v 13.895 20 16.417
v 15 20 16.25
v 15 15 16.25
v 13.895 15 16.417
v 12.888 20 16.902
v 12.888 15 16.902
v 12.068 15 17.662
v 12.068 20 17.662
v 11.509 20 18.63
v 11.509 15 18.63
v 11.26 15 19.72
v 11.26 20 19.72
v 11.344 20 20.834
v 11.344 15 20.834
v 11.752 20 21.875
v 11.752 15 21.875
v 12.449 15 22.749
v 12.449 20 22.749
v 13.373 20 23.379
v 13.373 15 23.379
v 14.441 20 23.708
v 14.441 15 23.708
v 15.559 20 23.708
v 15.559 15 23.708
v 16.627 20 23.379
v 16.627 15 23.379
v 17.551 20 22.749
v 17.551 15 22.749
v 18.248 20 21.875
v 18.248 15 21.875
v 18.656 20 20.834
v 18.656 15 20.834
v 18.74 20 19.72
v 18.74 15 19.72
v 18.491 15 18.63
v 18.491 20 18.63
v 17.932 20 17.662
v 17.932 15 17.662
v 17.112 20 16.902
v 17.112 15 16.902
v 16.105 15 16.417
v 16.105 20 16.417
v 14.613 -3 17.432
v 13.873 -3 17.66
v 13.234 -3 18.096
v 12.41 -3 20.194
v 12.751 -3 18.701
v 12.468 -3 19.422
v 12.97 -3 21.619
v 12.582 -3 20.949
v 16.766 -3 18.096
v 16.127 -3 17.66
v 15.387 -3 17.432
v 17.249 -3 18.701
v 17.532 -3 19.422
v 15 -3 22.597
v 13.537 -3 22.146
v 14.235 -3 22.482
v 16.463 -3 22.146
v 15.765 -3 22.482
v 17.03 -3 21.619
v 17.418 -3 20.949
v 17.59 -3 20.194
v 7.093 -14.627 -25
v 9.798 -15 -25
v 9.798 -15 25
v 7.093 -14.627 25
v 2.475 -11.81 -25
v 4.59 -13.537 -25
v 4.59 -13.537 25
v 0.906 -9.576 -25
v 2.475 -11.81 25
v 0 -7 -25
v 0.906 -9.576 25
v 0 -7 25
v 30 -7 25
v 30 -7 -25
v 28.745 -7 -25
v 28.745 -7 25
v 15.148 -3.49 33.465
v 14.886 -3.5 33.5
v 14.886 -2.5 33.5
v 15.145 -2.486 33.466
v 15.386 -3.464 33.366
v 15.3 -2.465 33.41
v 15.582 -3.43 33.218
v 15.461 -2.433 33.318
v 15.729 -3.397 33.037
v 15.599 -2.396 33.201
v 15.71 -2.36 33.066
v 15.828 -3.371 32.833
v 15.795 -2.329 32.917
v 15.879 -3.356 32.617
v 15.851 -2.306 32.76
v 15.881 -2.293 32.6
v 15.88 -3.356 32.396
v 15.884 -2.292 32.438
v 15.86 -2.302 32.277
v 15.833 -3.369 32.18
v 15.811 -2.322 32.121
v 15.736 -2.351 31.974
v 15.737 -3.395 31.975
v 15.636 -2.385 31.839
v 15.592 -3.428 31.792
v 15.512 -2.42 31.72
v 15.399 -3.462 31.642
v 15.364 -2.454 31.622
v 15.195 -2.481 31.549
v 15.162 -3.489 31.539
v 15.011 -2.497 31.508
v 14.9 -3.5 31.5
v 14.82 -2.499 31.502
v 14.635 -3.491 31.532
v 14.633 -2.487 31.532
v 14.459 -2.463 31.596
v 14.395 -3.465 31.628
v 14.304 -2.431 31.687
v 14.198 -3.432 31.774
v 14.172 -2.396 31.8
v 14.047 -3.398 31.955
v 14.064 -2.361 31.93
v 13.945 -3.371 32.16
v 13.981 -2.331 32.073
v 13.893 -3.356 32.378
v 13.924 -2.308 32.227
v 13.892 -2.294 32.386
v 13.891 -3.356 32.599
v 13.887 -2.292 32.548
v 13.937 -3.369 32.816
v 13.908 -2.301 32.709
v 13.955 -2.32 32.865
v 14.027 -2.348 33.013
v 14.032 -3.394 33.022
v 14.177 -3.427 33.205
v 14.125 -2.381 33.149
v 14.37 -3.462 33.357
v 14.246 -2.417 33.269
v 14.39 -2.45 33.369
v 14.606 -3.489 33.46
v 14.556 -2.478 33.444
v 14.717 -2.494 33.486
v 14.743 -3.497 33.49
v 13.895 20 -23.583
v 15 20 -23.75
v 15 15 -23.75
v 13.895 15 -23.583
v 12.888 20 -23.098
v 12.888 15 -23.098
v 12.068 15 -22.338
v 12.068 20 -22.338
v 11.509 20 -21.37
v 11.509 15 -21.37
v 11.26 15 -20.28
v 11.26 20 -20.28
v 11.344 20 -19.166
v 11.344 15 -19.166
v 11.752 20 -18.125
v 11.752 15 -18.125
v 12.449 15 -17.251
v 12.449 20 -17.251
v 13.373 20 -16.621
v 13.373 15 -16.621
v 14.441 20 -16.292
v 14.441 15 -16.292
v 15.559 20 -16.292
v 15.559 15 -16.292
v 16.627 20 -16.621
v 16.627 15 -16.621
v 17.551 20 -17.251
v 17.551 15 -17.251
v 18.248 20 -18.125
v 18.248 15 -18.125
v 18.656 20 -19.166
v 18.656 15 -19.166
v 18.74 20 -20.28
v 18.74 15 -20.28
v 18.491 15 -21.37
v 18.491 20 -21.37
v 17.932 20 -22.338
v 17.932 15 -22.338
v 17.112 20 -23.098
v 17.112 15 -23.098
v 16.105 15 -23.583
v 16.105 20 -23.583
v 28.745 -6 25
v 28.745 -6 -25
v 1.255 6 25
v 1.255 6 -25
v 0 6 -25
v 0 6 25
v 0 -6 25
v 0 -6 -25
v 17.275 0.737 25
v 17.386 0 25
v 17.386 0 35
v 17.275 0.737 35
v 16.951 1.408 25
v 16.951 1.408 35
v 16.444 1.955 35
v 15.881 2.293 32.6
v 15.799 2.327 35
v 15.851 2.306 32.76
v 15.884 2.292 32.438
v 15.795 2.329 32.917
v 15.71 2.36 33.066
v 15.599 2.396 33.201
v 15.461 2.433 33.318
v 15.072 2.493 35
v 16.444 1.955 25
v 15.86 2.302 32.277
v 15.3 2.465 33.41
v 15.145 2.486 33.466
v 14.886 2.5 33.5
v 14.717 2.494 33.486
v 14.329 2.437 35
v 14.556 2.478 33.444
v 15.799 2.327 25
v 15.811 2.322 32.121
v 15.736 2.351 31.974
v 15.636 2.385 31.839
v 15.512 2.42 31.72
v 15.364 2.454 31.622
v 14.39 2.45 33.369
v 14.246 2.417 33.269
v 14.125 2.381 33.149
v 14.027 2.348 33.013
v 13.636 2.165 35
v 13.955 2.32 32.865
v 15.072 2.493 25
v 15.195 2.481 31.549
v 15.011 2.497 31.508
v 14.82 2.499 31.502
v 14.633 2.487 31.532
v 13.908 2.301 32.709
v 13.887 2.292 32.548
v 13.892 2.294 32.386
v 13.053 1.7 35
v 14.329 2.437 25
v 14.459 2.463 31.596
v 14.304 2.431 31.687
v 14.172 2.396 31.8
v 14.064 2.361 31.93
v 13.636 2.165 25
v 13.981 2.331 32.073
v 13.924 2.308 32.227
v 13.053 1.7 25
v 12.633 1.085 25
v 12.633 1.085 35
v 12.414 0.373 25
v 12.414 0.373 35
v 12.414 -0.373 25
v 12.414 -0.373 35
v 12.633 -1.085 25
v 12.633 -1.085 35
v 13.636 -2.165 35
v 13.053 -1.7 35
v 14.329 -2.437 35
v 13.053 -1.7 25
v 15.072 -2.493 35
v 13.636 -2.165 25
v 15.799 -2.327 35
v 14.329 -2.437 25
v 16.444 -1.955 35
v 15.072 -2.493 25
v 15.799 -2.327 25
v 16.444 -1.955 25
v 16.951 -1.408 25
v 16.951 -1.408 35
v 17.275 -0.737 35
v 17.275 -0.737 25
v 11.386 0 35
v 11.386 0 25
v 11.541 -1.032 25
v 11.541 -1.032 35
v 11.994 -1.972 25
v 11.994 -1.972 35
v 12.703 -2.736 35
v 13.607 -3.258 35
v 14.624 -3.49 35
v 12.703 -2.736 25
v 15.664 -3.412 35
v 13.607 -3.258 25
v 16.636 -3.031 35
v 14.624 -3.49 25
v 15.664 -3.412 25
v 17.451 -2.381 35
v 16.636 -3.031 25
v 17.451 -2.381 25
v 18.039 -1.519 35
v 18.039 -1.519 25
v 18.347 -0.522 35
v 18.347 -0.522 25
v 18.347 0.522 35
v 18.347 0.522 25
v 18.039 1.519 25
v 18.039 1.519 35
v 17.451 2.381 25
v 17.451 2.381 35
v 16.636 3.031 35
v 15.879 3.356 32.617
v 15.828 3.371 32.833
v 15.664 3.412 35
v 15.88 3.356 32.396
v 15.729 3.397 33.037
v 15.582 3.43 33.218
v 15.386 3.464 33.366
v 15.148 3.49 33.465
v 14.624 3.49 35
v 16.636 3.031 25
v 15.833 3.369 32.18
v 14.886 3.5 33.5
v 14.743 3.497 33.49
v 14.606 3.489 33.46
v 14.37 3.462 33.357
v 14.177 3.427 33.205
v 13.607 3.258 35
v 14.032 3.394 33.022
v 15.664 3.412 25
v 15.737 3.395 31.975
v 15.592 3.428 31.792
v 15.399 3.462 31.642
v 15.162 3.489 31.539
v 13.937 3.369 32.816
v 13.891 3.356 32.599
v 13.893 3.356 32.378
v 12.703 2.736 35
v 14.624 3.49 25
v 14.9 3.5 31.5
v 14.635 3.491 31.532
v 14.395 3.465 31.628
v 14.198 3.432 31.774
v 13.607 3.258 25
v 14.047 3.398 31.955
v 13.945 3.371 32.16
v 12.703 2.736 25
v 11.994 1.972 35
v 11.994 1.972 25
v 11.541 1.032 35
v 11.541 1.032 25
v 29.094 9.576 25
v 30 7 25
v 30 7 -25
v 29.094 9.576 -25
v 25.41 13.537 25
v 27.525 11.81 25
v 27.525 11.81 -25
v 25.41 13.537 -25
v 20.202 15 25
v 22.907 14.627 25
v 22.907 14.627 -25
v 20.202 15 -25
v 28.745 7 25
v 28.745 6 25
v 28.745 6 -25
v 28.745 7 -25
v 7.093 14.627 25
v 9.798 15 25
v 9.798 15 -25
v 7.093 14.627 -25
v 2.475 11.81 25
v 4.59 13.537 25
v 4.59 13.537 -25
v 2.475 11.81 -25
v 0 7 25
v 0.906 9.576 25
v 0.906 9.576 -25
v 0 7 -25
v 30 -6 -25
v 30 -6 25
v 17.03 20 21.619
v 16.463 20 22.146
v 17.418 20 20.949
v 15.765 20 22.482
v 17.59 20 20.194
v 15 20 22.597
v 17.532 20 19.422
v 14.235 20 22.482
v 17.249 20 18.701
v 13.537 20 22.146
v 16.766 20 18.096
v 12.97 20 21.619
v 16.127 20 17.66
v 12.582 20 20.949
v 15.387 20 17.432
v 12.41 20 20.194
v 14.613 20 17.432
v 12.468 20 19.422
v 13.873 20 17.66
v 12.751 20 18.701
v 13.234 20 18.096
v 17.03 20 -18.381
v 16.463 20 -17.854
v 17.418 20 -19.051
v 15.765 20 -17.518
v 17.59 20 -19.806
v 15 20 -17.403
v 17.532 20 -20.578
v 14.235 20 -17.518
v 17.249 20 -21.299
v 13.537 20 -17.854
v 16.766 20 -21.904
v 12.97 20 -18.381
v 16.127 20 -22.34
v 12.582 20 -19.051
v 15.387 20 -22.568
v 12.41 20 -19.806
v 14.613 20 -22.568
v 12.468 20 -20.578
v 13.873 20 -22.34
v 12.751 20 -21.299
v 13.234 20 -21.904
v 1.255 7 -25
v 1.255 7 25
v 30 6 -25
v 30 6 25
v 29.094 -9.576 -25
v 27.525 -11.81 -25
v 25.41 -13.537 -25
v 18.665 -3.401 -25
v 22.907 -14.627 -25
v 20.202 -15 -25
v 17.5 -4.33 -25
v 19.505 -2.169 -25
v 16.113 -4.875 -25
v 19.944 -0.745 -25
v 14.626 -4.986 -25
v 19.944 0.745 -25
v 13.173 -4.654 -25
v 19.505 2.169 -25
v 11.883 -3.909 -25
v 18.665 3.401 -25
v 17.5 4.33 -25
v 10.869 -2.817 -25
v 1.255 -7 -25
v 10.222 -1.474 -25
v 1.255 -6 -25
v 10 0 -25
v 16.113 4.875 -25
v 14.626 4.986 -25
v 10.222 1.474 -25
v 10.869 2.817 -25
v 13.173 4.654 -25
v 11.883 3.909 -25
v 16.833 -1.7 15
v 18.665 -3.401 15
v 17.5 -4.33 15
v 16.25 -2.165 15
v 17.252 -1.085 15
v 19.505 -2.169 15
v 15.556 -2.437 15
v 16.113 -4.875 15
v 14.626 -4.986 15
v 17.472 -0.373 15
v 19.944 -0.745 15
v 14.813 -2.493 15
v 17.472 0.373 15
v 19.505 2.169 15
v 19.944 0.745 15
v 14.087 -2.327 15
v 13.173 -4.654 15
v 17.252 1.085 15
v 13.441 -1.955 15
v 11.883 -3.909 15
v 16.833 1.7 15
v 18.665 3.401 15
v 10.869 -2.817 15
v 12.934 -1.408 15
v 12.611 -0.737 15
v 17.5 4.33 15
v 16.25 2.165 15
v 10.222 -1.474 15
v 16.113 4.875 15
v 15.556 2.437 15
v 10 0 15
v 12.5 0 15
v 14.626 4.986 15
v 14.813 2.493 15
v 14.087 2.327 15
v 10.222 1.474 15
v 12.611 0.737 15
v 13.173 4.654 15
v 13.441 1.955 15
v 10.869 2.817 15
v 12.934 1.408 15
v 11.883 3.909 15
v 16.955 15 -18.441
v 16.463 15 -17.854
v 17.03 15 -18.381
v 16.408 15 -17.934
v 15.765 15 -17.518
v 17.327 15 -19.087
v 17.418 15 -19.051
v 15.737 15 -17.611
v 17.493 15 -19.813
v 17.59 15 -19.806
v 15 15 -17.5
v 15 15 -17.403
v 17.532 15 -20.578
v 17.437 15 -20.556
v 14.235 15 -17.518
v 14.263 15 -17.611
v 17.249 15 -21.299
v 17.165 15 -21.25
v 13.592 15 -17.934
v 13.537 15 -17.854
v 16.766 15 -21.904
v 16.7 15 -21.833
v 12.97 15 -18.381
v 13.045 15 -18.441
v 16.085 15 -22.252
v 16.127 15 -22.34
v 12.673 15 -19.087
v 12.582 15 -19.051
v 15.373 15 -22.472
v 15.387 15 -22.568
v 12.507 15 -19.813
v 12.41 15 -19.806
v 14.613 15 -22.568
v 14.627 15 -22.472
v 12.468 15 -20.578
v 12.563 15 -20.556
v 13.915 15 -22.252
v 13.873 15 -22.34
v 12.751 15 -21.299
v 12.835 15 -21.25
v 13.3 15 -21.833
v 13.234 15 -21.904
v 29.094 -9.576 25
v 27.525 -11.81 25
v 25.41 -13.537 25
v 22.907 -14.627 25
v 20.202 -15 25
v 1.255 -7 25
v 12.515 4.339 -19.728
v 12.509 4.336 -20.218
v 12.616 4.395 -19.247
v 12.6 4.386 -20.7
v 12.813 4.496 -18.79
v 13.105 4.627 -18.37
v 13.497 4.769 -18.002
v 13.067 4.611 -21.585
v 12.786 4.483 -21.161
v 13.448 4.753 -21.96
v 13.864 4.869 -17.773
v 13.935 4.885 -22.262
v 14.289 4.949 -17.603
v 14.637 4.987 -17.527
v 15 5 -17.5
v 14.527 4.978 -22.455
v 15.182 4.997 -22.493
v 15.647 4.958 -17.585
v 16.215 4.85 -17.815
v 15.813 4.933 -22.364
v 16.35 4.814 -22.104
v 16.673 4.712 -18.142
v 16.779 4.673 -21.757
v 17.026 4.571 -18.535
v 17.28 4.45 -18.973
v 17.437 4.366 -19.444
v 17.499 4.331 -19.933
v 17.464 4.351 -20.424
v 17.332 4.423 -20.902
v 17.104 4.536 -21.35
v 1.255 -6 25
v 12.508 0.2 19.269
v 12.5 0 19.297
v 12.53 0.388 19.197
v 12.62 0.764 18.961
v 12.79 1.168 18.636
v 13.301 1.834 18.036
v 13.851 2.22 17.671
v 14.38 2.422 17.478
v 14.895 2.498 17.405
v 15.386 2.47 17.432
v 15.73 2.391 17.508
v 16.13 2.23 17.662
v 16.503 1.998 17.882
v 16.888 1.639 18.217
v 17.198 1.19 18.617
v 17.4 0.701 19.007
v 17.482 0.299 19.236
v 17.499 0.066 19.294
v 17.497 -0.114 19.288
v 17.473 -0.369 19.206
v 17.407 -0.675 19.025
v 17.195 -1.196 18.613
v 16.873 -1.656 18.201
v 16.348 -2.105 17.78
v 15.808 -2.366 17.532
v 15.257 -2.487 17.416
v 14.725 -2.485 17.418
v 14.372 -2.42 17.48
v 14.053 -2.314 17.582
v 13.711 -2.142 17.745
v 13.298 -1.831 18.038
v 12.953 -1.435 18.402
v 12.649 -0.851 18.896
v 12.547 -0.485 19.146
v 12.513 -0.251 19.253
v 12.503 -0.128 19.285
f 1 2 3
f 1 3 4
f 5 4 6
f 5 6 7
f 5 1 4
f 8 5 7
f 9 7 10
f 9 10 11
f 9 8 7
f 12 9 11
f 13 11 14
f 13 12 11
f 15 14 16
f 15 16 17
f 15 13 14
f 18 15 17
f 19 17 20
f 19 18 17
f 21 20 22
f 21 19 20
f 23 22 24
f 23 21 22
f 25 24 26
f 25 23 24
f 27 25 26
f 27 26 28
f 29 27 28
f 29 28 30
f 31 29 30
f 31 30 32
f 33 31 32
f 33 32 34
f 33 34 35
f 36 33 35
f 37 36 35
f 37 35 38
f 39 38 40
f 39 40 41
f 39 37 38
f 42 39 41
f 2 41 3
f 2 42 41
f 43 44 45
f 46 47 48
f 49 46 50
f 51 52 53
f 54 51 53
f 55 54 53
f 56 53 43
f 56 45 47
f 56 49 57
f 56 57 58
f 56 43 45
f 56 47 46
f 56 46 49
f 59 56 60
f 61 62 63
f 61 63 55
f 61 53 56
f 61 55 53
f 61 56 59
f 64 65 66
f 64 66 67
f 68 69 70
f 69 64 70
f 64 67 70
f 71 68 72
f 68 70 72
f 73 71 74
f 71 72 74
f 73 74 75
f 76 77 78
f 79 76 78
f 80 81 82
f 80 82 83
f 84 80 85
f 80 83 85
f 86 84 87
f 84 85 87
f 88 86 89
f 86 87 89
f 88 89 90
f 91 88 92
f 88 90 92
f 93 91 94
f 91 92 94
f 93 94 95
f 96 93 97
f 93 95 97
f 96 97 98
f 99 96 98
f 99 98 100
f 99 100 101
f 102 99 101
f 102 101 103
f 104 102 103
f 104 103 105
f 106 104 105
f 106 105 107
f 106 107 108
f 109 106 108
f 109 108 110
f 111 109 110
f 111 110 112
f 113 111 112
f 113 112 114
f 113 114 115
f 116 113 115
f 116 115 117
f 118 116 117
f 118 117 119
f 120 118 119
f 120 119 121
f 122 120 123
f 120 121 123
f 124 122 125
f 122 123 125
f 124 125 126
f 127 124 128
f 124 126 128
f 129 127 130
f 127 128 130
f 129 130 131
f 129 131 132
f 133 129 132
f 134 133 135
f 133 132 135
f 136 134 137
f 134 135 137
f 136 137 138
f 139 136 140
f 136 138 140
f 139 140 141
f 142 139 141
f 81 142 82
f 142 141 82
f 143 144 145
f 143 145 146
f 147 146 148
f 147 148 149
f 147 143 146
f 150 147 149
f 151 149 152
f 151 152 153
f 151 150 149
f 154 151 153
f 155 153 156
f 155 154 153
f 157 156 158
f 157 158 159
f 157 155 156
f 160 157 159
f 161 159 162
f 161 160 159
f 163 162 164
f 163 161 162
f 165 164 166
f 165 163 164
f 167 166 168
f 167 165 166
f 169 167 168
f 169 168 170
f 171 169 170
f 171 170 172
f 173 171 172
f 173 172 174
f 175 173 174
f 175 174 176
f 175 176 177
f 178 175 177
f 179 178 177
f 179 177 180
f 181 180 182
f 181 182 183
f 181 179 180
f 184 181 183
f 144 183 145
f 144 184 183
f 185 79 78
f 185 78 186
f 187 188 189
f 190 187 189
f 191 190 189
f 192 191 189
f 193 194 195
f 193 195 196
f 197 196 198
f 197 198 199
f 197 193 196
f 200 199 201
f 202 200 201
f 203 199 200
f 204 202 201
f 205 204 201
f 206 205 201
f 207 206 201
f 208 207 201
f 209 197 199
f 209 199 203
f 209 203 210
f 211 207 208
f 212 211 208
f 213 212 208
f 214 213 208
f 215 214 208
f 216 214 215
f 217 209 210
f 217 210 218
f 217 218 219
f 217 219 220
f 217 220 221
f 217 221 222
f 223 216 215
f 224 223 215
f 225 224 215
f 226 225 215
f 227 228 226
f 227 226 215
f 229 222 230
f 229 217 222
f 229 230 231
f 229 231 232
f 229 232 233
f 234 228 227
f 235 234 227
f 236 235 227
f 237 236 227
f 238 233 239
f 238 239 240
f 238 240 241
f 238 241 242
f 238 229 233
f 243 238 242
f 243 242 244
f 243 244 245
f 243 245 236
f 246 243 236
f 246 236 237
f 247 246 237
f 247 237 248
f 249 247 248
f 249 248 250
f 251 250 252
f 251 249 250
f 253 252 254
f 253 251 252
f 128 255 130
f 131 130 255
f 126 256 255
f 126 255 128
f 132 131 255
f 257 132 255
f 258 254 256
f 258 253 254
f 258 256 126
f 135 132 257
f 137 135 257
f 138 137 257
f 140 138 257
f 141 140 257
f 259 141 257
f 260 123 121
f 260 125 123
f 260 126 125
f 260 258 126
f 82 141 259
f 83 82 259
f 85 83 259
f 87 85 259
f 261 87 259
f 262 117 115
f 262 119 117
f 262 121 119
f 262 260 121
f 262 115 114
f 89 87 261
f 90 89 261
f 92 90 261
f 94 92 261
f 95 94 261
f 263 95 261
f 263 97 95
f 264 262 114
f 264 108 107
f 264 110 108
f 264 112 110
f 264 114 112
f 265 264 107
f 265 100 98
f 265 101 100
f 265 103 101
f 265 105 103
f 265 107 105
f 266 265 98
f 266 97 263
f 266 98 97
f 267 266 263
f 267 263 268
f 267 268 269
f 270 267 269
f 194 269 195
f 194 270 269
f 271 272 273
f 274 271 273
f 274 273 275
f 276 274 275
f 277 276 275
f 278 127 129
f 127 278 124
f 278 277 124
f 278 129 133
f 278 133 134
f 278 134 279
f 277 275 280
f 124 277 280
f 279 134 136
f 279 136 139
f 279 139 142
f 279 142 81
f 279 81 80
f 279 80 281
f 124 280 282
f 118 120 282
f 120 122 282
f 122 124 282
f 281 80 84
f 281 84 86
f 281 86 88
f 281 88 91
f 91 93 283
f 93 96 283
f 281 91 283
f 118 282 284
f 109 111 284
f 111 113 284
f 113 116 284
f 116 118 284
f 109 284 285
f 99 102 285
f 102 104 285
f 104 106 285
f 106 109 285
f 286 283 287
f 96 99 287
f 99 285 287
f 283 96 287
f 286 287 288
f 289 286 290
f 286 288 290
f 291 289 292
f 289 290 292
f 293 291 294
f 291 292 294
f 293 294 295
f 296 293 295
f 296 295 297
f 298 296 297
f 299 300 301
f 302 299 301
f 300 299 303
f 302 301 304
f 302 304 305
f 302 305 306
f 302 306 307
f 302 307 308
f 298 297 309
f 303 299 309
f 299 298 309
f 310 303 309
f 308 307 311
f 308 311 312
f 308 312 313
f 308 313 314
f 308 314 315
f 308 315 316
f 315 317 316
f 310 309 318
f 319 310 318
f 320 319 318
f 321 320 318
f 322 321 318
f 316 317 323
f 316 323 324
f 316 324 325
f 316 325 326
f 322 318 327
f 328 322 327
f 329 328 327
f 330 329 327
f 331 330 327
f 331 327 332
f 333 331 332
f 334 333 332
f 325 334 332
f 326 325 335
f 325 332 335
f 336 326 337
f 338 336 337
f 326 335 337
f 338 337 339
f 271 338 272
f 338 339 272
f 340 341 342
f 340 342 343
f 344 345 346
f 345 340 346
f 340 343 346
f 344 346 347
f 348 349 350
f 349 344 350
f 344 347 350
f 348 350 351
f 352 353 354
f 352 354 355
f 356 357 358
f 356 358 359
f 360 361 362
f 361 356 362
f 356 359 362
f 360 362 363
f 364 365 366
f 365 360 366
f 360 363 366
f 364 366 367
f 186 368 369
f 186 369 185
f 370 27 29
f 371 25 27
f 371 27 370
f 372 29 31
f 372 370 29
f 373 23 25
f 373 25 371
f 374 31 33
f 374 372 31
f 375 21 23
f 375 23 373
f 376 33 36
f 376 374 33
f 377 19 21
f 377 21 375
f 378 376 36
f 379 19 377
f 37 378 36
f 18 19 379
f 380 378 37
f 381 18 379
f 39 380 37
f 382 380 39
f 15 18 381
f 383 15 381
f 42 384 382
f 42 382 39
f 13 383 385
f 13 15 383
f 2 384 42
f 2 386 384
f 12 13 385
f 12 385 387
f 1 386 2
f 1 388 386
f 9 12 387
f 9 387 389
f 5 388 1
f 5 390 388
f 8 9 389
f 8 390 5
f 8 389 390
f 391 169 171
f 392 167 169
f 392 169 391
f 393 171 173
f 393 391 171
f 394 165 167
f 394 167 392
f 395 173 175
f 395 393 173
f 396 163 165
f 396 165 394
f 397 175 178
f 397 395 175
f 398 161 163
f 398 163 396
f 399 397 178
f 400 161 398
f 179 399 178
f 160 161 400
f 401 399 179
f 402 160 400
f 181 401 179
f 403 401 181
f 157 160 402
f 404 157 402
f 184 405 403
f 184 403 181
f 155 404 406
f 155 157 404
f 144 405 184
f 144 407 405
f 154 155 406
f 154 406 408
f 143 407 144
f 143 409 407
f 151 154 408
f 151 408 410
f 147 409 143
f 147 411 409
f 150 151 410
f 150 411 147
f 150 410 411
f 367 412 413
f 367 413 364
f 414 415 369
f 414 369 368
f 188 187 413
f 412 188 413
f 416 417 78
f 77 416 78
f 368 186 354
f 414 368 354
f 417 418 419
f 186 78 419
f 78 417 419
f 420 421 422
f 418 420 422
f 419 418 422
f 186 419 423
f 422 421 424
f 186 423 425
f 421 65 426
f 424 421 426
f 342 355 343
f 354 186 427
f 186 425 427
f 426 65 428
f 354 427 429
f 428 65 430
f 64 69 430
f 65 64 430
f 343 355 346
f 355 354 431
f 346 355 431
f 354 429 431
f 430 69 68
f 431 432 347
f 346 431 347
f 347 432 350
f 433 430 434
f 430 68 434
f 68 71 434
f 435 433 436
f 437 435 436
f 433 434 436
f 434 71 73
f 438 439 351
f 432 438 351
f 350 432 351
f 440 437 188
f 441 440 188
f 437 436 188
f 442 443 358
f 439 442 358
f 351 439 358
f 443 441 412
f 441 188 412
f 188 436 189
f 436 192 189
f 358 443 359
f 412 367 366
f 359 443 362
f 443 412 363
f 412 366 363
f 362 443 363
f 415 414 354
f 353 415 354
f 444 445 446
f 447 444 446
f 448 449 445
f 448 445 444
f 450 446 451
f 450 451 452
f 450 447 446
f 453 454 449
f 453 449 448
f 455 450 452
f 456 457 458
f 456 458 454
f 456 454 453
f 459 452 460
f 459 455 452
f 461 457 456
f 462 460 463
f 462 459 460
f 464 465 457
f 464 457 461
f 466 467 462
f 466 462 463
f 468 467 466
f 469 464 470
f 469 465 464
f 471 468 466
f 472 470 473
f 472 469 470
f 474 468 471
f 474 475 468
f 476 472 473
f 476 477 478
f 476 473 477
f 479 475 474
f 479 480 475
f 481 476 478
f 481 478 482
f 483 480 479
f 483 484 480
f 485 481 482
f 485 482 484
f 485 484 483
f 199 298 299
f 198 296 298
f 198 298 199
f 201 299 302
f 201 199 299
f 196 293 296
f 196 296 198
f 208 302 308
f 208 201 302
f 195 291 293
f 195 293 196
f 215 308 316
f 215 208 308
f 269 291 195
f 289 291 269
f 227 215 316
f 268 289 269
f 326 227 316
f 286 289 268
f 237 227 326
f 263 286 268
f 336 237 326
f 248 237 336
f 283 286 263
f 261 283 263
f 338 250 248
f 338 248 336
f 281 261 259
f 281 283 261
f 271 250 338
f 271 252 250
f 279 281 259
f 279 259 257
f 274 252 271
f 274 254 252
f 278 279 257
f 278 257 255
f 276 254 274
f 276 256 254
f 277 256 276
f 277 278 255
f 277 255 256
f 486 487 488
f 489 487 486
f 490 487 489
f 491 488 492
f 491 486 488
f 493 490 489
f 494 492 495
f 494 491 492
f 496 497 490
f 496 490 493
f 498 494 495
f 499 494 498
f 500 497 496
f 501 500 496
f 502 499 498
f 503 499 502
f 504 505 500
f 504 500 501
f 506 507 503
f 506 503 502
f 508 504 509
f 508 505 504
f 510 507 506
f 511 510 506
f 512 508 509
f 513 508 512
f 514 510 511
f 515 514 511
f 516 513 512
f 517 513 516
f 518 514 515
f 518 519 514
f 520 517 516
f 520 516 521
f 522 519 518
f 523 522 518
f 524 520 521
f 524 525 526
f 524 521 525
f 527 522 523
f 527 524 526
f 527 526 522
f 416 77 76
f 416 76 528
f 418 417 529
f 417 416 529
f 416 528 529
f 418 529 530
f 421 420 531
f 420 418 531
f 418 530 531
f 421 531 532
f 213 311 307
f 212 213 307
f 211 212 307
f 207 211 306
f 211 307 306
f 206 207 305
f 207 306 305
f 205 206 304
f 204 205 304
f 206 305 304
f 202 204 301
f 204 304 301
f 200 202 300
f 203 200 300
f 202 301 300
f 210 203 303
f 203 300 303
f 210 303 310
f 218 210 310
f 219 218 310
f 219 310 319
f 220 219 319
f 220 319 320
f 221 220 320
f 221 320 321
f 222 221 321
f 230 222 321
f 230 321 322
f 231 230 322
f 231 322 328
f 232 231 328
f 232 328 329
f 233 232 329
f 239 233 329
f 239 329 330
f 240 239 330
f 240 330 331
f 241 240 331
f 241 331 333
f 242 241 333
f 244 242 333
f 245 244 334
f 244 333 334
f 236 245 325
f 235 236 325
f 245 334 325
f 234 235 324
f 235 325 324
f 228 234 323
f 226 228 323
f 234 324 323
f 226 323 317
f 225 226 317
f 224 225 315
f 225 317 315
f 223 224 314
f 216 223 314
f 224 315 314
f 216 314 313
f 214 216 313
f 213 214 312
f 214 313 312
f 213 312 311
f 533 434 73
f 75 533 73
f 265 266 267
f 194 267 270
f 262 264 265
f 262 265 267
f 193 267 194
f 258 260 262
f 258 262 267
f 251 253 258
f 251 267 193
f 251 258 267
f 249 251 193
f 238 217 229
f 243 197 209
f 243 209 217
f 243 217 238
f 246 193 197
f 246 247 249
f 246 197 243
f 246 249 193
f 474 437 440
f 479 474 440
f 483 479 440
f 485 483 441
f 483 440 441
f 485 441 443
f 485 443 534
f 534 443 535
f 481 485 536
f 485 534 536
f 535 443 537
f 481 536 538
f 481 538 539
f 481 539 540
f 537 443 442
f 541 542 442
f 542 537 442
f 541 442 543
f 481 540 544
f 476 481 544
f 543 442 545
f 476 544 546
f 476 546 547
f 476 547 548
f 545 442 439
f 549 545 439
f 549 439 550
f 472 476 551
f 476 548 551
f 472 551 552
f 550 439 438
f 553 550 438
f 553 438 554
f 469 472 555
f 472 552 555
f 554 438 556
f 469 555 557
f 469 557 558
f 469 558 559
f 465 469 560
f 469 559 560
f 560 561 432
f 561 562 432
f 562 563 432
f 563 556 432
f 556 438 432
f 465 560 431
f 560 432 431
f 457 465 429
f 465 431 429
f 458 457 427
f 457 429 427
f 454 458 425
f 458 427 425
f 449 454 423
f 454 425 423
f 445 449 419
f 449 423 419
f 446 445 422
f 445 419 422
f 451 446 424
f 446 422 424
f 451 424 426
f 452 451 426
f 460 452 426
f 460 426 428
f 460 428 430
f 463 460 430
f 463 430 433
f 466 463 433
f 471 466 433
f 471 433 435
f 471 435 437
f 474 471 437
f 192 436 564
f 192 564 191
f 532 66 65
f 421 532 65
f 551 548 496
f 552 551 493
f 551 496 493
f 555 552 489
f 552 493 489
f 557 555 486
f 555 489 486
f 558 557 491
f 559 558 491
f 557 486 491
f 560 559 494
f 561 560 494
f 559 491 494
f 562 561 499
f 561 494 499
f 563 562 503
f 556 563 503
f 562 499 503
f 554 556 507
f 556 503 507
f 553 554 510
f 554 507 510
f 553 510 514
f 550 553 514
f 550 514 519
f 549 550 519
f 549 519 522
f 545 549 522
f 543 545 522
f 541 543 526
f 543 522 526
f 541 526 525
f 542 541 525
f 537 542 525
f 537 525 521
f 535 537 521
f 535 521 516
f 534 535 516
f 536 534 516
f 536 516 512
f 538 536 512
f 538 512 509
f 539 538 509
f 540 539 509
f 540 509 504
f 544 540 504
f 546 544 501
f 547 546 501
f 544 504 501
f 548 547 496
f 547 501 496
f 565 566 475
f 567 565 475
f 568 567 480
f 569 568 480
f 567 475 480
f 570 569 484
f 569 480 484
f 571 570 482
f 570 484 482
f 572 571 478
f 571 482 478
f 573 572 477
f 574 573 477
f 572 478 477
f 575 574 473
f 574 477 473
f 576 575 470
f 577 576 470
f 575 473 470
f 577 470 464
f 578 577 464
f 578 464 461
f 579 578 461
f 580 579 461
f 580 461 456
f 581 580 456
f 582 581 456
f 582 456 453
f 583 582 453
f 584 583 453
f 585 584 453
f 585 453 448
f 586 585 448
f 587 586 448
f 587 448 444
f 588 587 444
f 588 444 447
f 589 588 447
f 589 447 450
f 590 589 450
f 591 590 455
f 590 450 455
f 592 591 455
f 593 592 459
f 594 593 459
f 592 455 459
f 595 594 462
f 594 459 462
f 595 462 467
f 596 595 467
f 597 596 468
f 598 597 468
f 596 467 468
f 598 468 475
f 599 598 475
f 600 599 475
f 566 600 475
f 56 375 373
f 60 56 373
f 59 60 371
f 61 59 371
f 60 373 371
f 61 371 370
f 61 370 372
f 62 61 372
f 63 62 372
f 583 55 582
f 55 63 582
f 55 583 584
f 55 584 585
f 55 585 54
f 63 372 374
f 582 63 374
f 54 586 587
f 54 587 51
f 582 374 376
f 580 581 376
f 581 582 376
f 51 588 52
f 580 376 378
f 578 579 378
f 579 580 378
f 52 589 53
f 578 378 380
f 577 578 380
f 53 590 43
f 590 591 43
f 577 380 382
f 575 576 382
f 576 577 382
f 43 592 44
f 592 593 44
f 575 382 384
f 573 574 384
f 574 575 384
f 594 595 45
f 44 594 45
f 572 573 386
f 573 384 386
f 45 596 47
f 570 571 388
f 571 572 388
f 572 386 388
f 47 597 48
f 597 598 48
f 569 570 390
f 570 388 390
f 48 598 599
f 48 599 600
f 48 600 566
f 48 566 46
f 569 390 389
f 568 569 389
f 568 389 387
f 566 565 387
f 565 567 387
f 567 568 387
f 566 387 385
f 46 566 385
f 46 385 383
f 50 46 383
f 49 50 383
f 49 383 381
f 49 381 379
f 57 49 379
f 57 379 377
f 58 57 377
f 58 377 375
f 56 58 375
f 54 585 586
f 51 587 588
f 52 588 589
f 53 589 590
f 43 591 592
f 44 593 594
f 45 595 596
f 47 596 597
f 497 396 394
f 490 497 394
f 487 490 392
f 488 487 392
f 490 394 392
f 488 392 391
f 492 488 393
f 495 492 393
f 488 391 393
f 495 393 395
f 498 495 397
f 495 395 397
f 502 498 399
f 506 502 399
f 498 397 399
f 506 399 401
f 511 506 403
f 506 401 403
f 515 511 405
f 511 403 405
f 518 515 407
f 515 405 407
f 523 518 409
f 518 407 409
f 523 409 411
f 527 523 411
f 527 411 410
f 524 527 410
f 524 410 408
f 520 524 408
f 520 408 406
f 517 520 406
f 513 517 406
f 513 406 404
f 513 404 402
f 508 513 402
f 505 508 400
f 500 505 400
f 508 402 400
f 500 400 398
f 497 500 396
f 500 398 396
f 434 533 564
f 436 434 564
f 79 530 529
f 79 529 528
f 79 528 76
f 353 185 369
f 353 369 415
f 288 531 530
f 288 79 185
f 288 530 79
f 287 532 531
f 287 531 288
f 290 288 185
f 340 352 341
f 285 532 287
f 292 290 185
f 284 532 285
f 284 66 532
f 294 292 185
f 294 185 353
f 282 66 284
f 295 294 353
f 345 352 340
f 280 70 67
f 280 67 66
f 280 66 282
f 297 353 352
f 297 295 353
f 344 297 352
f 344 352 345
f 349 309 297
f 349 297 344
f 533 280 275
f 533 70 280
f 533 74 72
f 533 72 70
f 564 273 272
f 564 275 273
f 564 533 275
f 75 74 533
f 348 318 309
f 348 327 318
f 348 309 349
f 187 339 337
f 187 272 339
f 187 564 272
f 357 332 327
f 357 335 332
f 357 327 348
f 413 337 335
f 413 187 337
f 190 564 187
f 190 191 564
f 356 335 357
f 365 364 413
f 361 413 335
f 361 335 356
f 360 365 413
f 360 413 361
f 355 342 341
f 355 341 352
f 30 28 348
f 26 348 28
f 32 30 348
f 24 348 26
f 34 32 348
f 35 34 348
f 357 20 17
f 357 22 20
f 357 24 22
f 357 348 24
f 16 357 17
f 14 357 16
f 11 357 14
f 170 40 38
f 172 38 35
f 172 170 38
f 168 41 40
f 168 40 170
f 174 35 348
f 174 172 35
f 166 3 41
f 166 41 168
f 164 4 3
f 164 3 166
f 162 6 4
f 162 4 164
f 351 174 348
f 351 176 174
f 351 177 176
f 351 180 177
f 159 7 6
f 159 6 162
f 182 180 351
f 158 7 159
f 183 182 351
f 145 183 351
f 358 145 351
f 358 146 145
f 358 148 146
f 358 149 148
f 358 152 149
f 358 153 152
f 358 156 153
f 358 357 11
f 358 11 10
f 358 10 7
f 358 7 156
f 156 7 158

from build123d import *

# Parameters (mm, degrees)
SKETCH1_W           = 50
SKETCH1_H           = 30
BOSS_EXTRUDE1_DEPTH = 30
SKETCH3_R           = 5
CUT_EXTRUDE1_DEPTH  = 40
SKETCH4_W           = 1.254965376
SKETCH4_H           = 1
CUT_EXTRUDE2_DEPTH  = 61.207972894
SKETCH5_R           = 2.5
SKETCH5_R_2         = 2.597055459
CUT_EXTRUDE3_DEPTH  = 18
BOSS_EXTRUDE2_START = 5
SKETCH6_R           = 3.75
SKETCH6_R_2         = 2.597055459
BOSS_EXTRUDE2_DEPTH = 5
SKETCH7_R           = 2.5
CUT_EXTRUDE4_DEPTH  = 5
SKETCH8_R           = 3.5
SKETCH8_R_2         = 2.5
BOSS_EXTRUDE3_DEPTH = 10
SKETCH9_R           = 1
CUT_EXTRUDE5_DEPTH  = 56
FILLET1_R           = 10


with BuildPart() as part:
    # Sketch1 → Boss-Extrude1 (new body)
    with BuildSketch(Plane(origin=(0, 0, 0), x_dir=(0, 0, -1), z_dir=(1, 0, 0))):
        Rectangle(SKETCH1_W, SKETCH1_H)
    extrude(amount=BOSS_EXTRUDE1_DEPTH)

    # Sketch3 → Cut-Extrude1 (cut)
    with BuildSketch(Plane(origin=(0, 0, -25), x_dir=(-1, 0, 0), z_dir=(0, 0, -1))):
        with Locations((-15, 0)):
            Circle(SKETCH3_R)
    extrude(amount=-CUT_EXTRUDE1_DEPTH, mode=Mode.SUBTRACT)

    # Sketch4 → Cut-Extrude2 (cut, through all)
    with BuildSketch(Plane(origin=(0, 0, -25), x_dir=(-1, 0, 0), z_dir=(0, 0, -1))):
        with Locations((-29.372517312, 6.5)):
            Rectangle(SKETCH4_W, SKETCH4_H)
        with Locations((-29.372517312, -6.5)):
            Rectangle(SKETCH4_W, SKETCH4_H)
        with Locations((-0.627482688, -6.5)):
            Rectangle(SKETCH4_W, SKETCH4_H)
        with Locations((-0.627482688, 6.5)):
            Rectangle(SKETCH4_W, SKETCH4_H)
    extrude(amount=-CUT_EXTRUDE2_DEPTH, mode=Mode.SUBTRACT)

    # Sketch5 → Cut-Extrude3 (cut)
    with BuildSketch(Plane(origin=(0, 15, 0), x_dir=(1, 0, 0), z_dir=(0, 1, 0))):
        with Locations(Location((15, 20, 0), (0, 0, 270))):
            Circle(SKETCH5_R)
        with Locations(Location((15, -20, 0), (0, 0, 270))):
            Circle(SKETCH5_R_2)
    extrude(amount=-CUT_EXTRUDE3_DEPTH, mode=Mode.SUBTRACT)

    # Sketch6 → Boss-Extrude2 (add)
    # profile 1 of 2: a face of its own
    with BuildSketch(Plane(origin=(0, 15, 0), x_dir=(1, 0, 0), z_dir=(0, 1, 0)).offset(BOSS_EXTRUDE2_START)):
        with Locations(Location((15, -20, 0), (0, 0, 90))):
            Circle(SKETCH6_R)
        with Locations(Location((15, -20, 0), (0, 0, 270))):
            Circle(SKETCH6_R_2, mode=Mode.SUBTRACT)
    # profile 2 of 2: a face of its own
    with BuildSketch(Plane(origin=(0, 15, 0), x_dir=(1, 0, 0), z_dir=(0, 1, 0)).offset(BOSS_EXTRUDE2_START)):
        with Locations(Location((15, 20, 0), (0, 0, 90))):
            Circle(SKETCH6_R)
        with Locations(Location((15, 20, 0), (0, 0, 270))):
            Circle(SKETCH6_R_2, mode=Mode.SUBTRACT)
    extrude(amount=-BOSS_EXTRUDE2_DEPTH)

    # Sketch7 → Cut-Extrude4 (cut)
    with BuildSketch(Plane(origin=(0, 0, 15), x_dir=(-1, 0, 0), z_dir=(0, 0, -1))):
        with Locations((-15, 0)):
            Circle(SKETCH7_R)
    extrude(amount=-CUT_EXTRUDE4_DEPTH, mode=Mode.SUBTRACT)

    # Sketch8 → Boss-Extrude3 (add)
    with BuildSketch(Plane.XY.offset(25)):
        with Locations(Location((14.885614907, 0, 0), (0, 0, 180))):
            Circle(SKETCH8_R)
        with Locations((14.885614907, 0)):
            Circle(SKETCH8_R_2, mode=Mode.SUBTRACT)
    extrude(amount=BOSS_EXTRUDE3_DEPTH)

    # Sketch9 → Cut-Extrude5 (cut, through all)
    with BuildSketch(Plane(origin=(0, 15, 0), x_dir=(1, 0, 0), z_dir=(0, 1, 0))):
        with Locations(Location((14.885614907, -32.5, 0), (0, 0, 270))):
            Circle(SKETCH9_R)
    extrude(amount=-CUT_EXTRUDE5_DEPTH, mode=Mode.SUBTRACT)

    # Fillet1
    # the kernel refuses this fillet: 10 mm, written as the material it takes off along each edge
    with BuildSketch(Plane(origin=(30, -15, 49.494897428), x_dir=(-1, 0, 0), z_dir=(0, 0, -1)), Plane(origin=(30, 15, -49.494897428), x_dir=(-1, 0, 0), z_dir=(0, 0, 1))) as fillet1_piece_1:
        with BuildLine():
            CenterArc((9.797958971, 10), FILLET1_R, 191.536959033, 78.463040967)
            Line((0, 8), (-0.195959179, 7.96))
            ThreePointArc((-0.195959179, 7.96), (-0.2, 4), (-0.2, 0))
            Line((-0.2, 0), (0, -0.2))
            Line((0, -0.2), (9.797958971, -0.2))
            Line((9.797958971, -0.2), (9.797958971, 0))
        make_face()
    extrude(amount=98.989794856, mode=Mode.SUBTRACT)
    with BuildSketch(Plane(origin=(0, -15, 49.494897428), x_dir=(1, 0, 0), z_dir=(0, 0, -1))) as fillet1_piece_2:
        with BuildLine():
            CenterArc((9.797958971, -10), FILLET1_R, 90, 78.463040967)
            Line((0, -8), (-0.195959179, -7.96))
            ThreePointArc((-0.195959179, -7.96), (-0.2, -4), (-0.2, 0))
            Line((-0.2, 0), (0, 0.2))
            Line((0, 0.2), (9.797958971, 0.2))
            Line((9.797958971, 0.2), (9.797958971, 0))
        make_face()
    extrude(amount=98.989794856, mode=Mode.SUBTRACT)
    with BuildSketch(Plane(origin=(0, 15, -49.494897428), x_dir=(0, -1, 0), z_dir=(0, 0, 1))) as fillet1_piece_3:
        with BuildLine():
            CenterArc((10, 9.797958971), FILLET1_R, 180, 78.463040967)
            Line((0, 9.797958971), (-0.2, 9.797958971))
            Line((-0.2, 9.797958971), (-0.2, 0))
            Line((-0.2, 0), (0, -0.2))
            ThreePointArc((0, -0.2), (4, -0.2), (7.96, -0.195959179))
            Line((7.96, -0.195959179), (8, 0))
        make_face()
    extrude(amount=98.989794856, mode=Mode.SUBTRACT)


solid = part.part
